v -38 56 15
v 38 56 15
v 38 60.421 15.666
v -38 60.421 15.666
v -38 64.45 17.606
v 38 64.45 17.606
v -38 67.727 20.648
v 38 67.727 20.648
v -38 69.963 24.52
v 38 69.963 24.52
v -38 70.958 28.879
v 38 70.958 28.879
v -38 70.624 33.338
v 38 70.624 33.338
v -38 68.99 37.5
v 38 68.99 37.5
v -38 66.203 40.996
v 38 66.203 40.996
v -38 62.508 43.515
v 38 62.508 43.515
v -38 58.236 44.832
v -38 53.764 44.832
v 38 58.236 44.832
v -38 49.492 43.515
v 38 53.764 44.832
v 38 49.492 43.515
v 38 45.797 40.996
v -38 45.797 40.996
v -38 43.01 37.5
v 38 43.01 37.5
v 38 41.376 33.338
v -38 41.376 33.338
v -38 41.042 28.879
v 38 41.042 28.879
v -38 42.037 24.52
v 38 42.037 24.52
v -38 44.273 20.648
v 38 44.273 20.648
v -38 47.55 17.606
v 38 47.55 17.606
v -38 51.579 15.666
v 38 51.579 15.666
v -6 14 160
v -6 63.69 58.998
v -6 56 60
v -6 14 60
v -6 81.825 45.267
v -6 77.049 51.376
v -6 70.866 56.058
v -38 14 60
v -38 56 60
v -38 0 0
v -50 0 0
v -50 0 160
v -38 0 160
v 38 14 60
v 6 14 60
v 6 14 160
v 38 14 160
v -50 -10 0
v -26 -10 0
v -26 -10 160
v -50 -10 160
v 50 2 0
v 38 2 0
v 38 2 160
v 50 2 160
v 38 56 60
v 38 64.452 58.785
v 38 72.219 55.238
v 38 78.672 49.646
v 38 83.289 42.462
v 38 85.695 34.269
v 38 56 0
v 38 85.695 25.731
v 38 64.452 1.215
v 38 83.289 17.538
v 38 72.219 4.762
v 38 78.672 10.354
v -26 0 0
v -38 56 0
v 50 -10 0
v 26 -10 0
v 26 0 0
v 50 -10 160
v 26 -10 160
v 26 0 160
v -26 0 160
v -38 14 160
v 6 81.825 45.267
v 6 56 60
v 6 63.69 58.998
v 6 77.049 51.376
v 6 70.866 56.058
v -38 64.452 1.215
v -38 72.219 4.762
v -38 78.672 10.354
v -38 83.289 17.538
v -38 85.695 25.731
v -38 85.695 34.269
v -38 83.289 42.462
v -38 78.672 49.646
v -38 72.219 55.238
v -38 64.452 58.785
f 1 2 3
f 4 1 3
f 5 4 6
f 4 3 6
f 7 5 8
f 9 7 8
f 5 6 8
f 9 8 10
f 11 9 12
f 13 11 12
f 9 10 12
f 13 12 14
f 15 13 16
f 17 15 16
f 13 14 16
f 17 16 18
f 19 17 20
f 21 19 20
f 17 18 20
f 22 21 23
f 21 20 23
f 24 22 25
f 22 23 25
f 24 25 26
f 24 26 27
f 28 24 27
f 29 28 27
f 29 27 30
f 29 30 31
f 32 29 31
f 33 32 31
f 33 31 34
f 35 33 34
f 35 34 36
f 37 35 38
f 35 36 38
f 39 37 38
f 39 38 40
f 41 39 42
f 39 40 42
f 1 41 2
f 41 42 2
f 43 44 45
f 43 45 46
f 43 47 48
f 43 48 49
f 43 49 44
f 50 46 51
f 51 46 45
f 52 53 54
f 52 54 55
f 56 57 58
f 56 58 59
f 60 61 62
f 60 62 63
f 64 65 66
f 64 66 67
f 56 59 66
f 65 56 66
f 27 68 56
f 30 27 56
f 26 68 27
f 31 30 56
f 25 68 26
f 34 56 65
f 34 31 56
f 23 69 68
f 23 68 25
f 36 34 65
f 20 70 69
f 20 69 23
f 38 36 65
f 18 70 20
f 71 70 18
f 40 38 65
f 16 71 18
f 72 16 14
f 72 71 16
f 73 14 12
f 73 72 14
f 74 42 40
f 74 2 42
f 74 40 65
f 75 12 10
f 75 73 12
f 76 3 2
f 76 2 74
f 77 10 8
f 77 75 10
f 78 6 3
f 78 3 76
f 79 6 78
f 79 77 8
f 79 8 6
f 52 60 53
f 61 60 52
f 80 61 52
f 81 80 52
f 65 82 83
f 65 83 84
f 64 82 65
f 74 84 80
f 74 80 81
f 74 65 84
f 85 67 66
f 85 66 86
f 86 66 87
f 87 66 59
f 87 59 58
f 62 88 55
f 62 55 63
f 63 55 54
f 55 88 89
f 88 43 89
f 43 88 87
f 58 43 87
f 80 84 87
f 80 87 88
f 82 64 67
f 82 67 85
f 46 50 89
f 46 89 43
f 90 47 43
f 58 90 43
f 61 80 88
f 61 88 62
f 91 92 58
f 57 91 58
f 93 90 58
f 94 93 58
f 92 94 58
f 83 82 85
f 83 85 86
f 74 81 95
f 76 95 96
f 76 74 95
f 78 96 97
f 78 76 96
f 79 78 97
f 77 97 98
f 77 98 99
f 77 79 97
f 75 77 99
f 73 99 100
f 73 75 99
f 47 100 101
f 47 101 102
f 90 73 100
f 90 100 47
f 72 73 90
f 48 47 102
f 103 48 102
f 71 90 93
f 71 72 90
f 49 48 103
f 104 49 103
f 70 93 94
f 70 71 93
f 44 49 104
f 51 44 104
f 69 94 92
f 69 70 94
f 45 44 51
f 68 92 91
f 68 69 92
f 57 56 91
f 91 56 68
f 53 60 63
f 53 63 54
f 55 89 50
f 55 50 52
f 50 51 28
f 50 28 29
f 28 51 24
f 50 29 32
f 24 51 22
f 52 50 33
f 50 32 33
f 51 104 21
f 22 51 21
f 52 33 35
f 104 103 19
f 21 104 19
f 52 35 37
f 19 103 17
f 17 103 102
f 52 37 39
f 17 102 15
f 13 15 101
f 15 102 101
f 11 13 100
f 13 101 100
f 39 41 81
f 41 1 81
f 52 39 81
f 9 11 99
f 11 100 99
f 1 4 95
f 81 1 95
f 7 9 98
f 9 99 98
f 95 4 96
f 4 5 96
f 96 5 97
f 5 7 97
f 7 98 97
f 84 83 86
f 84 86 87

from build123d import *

# Parameters (mm, degrees)
BOSS_EXTRUDE1_DEPTH = 160
BOSS_EXTRUDE2_START = -12
SKETCH2_W           = 60
SKETCH2_H           = 72
BOSS_EXTRUDE2_DEPTH = 76
FILLET1_RADIUS      = 30
FILLET1_LENGTH      = 76
SKETCH3_R           = 15
CUT_EXTRUDE1_DEPTH  = 76
RIB1_REACH          = 190.404
SKETCH4_WALL_W      = 512.089299886
SKETCH4_WALL_H      = 12


with BuildPart() as part:
    # Sketch1 → Boss-Extrude1 (new body)
    with BuildSketch(Plane.XY):
        Polygon((26, 0), (-26, 0), (-26, -10), (-50, -10), (-50, 0), (-38, 0), (-38, 14), (38, 14), (38, 2), (50, 2), (50, -10), (26, -10), align=None)
    extrude(amount=BOSS_EXTRUDE1_DEPTH)

    # Sketch2 → Boss-Extrude2 (add)
    with BuildSketch(Plane(origin=(50, 0, 0), x_dir=(0, 0, -1), z_dir=(1, 0, 0)).offset(BOSS_EXTRUDE2_START)):
        with Locations((-30, 50)):
            Rectangle(SKETCH2_W, SKETCH2_H)
    extrude(amount=-BOSS_EXTRUDE2_DEPTH)

    # Fillet1: full round fillet: the end face becomes a half cylinder, R = half its width
    fillet1_face = Plane((0, 86, 30), x_dir=(1, 0, 0), z_dir=(0, 1, 0))  # on the end face: x along it, z out of the body
    fillet1_slab = fillet1_face.offset(-FILLET1_RADIUS / 2) * Box(FILLET1_LENGTH, 2 * FILLET1_RADIUS, FILLET1_RADIUS, mode=Mode.PRIVATE)  # the body's end, R deep
    fillet1_round = Plane((0, 56, 30), x_dir=(0, 1, 0), z_dir=(1, 0, 0)) * Cylinder(FILLET1_RADIUS, FILLET1_LENGTH, mode=Mode.PRIVATE)  # its axis R under the face
    add(fillet1_slab - fillet1_round, mode=Mode.SUBTRACT)

    # Sketch3 → Cut-Extrude1 (cut)
    with BuildSketch(Plane(origin=(38, 0, 0), x_dir=(0, 0, -1), z_dir=(1, 0, 0))):
        with Locations((-30, 56)):
            Circle(SKETCH3_R)
    extrude(amount=-CUT_EXTRUDE1_DEPTH, mode=Mode.SUBTRACT)

    # Sketch4 wall → Rib1 (add, up to next)
    with BuildSketch(Plane(origin=(0, 47.912517706, 102.633274951), x_dir=(0, -0.508884996756, 0.860834513758), z_dir=(0, -0.860834513758, -0.508884996756)), mode=Mode.PRIVATE) as rib1_sk1:
        Rectangle(SKETCH4_WALL_W, SKETCH4_WALL_H)
    rib1_tool1 = extrude(rib1_sk1.sketch, amount=RIB1_REACH, mode=Mode.PRIVATE) - part.part
    add(rib1_tool1.solids().sort_by_distance((0, 47.912517706, 102.633274951))[0])


solid = part.part
